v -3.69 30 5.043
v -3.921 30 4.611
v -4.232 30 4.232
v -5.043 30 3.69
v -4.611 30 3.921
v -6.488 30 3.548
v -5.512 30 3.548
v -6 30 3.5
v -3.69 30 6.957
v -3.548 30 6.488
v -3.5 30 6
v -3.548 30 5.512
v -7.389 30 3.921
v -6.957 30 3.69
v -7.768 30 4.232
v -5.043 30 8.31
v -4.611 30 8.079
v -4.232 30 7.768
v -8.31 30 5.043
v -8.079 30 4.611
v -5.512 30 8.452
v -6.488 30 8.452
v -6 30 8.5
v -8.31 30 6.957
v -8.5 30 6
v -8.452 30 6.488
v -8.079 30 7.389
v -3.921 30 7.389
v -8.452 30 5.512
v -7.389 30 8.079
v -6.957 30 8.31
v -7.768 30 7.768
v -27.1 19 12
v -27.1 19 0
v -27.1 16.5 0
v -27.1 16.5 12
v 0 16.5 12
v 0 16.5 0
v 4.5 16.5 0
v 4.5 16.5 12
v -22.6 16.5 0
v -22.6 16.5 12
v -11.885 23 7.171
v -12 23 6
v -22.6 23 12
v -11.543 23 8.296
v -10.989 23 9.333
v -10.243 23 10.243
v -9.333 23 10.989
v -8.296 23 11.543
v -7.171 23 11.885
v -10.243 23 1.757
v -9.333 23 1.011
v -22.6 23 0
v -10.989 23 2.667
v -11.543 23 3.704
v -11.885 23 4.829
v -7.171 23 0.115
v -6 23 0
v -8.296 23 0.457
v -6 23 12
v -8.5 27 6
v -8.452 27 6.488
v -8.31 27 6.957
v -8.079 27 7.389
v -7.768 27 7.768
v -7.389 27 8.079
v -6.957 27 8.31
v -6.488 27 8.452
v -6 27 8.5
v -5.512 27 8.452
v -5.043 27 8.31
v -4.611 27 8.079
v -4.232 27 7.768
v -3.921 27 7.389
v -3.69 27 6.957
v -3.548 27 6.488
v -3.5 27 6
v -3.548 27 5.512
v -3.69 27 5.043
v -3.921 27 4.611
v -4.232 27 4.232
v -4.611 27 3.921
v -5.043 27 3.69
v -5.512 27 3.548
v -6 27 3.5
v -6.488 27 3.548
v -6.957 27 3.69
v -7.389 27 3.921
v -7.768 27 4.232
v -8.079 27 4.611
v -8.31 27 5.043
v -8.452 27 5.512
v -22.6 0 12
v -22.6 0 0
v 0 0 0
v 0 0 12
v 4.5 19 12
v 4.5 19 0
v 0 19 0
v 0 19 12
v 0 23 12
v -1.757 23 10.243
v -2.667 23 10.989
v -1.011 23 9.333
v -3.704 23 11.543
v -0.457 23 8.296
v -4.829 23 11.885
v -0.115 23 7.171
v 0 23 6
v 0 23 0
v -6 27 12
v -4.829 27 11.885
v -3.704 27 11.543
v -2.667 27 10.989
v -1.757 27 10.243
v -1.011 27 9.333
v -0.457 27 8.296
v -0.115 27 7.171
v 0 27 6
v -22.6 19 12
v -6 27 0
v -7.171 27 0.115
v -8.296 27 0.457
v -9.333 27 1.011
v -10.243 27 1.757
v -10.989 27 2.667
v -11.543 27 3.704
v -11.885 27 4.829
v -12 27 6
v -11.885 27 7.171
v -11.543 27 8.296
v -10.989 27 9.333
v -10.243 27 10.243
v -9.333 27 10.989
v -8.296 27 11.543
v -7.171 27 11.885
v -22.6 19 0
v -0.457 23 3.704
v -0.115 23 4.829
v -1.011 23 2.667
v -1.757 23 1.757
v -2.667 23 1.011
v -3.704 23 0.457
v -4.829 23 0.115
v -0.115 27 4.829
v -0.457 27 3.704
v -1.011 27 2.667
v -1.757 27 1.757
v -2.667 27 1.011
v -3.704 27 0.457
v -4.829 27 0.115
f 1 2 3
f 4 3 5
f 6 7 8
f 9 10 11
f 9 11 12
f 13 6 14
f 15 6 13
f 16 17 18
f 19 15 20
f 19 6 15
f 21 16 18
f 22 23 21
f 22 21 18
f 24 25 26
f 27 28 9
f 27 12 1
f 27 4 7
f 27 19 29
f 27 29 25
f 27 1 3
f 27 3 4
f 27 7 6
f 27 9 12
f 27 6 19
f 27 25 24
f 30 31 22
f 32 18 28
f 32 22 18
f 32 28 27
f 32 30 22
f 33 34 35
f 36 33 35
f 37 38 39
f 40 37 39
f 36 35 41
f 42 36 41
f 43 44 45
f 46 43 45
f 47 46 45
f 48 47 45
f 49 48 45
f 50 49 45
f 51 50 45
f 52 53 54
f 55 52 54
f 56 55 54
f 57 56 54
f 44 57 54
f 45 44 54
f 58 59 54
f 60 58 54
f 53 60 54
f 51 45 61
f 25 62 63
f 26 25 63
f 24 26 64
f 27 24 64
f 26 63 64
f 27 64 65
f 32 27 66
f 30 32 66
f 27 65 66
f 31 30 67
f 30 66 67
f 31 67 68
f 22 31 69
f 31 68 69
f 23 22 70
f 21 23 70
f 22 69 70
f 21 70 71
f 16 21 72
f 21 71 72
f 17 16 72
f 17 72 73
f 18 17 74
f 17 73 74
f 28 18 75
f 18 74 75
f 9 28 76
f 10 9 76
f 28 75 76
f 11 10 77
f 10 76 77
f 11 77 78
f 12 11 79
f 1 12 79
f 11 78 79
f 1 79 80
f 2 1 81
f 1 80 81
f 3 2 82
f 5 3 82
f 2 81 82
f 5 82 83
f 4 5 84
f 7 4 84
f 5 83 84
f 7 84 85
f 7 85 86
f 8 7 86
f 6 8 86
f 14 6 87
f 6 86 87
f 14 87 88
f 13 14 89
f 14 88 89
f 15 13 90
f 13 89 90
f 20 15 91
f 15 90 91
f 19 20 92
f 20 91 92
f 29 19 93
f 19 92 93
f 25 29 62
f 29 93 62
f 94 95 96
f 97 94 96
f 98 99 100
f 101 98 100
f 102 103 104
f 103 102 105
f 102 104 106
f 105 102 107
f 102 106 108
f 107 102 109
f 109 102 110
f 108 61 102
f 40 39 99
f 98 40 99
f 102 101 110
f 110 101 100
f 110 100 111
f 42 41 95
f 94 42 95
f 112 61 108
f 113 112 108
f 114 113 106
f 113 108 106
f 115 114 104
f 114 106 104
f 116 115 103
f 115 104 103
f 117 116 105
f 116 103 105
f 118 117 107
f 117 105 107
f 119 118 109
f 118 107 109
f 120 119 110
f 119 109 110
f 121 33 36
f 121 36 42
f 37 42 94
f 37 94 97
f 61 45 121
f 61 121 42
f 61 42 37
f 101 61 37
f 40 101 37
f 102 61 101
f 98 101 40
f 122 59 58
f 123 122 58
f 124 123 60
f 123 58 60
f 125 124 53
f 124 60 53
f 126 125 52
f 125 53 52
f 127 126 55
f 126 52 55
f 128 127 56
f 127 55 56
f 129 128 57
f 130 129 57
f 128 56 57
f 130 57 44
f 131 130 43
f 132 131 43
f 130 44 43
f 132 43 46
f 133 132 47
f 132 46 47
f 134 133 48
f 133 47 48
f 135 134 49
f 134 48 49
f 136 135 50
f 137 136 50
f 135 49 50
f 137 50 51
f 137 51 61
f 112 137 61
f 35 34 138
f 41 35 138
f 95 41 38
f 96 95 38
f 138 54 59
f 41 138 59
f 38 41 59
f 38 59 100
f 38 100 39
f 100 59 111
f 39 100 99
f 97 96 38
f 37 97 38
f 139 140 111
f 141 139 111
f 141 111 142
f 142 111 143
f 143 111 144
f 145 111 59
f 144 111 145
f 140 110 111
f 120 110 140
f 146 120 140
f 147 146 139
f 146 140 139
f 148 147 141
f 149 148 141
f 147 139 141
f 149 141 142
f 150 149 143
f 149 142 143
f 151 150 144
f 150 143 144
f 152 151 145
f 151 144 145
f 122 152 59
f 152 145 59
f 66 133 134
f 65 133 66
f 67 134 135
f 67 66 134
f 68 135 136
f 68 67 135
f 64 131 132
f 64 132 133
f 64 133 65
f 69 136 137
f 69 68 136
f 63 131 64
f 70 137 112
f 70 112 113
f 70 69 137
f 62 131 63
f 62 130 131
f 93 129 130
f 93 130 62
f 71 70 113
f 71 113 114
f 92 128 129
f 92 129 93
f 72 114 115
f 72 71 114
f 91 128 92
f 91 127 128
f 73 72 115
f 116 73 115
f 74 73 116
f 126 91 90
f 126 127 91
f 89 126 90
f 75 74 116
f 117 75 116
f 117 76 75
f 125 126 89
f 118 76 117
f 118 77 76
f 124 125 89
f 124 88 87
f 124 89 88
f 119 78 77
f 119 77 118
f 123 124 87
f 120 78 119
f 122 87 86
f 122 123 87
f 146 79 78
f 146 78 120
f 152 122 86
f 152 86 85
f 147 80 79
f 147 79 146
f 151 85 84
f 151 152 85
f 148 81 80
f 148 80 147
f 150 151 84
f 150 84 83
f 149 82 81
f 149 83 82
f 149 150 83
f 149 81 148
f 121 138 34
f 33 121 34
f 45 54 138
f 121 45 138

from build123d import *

# Parameters (mm, degrees)
BOSS_EXTRUDE1_DEPTH = 12
BOSS_EXTRUDE2_DEPTH = 4
SKETCH3_R           = 2.5
BOSS_EXTRUDE3_DEPTH = 3


with BuildPart() as part:
    # Sketch1 → Boss-Extrude1 (new body)
    with BuildSketch(Plane.XY):
        Polygon((0, 0), (0, 16.5), (4.5, 16.5), (4.5, 19), (0, 19), (0, 23), (-22.6, 23), (-22.6, 19), (-27.1, 19), (-27.1, 16.5), (-22.6, 16.5), (-22.6, 0), align=None)
    extrude(amount=BOSS_EXTRUDE1_DEPTH)

    # Sketch2 → Boss-Extrude2 (add)
    with BuildSketch(Plane(origin=(0, 23, 0), x_dir=(1, 0, 0), z_dir=(0, 1, 0))):
        with BuildLine():
            ThreePointArc((-6, 0), (-12, -6), (-6, -12))
            Line((-6, -12), (-6, 0))
        make_face()
        with BuildLine():
            Line((-6, 0), (-6, -12))
            ThreePointArc((-6, -12), (-1.757359313, -10.242640687), (0, -6))
            ThreePointArc((0, -6), (-1.757359313, -1.757359313), (-6, 0))
        make_face()
    extrude(amount=BOSS_EXTRUDE2_DEPTH)

    # Sketch3 → Boss-Extrude3 (add)
    with BuildSketch(Plane(origin=(0, 27, 0), x_dir=(1, 0, 0), z_dir=(0, 1, 0))):
        with Locations(Location((-6, -6, 0), (0, 0, 180))):
            Circle(SKETCH3_R)
    extrude(amount=BOSS_EXTRUDE3_DEPTH)


solid = part.part
